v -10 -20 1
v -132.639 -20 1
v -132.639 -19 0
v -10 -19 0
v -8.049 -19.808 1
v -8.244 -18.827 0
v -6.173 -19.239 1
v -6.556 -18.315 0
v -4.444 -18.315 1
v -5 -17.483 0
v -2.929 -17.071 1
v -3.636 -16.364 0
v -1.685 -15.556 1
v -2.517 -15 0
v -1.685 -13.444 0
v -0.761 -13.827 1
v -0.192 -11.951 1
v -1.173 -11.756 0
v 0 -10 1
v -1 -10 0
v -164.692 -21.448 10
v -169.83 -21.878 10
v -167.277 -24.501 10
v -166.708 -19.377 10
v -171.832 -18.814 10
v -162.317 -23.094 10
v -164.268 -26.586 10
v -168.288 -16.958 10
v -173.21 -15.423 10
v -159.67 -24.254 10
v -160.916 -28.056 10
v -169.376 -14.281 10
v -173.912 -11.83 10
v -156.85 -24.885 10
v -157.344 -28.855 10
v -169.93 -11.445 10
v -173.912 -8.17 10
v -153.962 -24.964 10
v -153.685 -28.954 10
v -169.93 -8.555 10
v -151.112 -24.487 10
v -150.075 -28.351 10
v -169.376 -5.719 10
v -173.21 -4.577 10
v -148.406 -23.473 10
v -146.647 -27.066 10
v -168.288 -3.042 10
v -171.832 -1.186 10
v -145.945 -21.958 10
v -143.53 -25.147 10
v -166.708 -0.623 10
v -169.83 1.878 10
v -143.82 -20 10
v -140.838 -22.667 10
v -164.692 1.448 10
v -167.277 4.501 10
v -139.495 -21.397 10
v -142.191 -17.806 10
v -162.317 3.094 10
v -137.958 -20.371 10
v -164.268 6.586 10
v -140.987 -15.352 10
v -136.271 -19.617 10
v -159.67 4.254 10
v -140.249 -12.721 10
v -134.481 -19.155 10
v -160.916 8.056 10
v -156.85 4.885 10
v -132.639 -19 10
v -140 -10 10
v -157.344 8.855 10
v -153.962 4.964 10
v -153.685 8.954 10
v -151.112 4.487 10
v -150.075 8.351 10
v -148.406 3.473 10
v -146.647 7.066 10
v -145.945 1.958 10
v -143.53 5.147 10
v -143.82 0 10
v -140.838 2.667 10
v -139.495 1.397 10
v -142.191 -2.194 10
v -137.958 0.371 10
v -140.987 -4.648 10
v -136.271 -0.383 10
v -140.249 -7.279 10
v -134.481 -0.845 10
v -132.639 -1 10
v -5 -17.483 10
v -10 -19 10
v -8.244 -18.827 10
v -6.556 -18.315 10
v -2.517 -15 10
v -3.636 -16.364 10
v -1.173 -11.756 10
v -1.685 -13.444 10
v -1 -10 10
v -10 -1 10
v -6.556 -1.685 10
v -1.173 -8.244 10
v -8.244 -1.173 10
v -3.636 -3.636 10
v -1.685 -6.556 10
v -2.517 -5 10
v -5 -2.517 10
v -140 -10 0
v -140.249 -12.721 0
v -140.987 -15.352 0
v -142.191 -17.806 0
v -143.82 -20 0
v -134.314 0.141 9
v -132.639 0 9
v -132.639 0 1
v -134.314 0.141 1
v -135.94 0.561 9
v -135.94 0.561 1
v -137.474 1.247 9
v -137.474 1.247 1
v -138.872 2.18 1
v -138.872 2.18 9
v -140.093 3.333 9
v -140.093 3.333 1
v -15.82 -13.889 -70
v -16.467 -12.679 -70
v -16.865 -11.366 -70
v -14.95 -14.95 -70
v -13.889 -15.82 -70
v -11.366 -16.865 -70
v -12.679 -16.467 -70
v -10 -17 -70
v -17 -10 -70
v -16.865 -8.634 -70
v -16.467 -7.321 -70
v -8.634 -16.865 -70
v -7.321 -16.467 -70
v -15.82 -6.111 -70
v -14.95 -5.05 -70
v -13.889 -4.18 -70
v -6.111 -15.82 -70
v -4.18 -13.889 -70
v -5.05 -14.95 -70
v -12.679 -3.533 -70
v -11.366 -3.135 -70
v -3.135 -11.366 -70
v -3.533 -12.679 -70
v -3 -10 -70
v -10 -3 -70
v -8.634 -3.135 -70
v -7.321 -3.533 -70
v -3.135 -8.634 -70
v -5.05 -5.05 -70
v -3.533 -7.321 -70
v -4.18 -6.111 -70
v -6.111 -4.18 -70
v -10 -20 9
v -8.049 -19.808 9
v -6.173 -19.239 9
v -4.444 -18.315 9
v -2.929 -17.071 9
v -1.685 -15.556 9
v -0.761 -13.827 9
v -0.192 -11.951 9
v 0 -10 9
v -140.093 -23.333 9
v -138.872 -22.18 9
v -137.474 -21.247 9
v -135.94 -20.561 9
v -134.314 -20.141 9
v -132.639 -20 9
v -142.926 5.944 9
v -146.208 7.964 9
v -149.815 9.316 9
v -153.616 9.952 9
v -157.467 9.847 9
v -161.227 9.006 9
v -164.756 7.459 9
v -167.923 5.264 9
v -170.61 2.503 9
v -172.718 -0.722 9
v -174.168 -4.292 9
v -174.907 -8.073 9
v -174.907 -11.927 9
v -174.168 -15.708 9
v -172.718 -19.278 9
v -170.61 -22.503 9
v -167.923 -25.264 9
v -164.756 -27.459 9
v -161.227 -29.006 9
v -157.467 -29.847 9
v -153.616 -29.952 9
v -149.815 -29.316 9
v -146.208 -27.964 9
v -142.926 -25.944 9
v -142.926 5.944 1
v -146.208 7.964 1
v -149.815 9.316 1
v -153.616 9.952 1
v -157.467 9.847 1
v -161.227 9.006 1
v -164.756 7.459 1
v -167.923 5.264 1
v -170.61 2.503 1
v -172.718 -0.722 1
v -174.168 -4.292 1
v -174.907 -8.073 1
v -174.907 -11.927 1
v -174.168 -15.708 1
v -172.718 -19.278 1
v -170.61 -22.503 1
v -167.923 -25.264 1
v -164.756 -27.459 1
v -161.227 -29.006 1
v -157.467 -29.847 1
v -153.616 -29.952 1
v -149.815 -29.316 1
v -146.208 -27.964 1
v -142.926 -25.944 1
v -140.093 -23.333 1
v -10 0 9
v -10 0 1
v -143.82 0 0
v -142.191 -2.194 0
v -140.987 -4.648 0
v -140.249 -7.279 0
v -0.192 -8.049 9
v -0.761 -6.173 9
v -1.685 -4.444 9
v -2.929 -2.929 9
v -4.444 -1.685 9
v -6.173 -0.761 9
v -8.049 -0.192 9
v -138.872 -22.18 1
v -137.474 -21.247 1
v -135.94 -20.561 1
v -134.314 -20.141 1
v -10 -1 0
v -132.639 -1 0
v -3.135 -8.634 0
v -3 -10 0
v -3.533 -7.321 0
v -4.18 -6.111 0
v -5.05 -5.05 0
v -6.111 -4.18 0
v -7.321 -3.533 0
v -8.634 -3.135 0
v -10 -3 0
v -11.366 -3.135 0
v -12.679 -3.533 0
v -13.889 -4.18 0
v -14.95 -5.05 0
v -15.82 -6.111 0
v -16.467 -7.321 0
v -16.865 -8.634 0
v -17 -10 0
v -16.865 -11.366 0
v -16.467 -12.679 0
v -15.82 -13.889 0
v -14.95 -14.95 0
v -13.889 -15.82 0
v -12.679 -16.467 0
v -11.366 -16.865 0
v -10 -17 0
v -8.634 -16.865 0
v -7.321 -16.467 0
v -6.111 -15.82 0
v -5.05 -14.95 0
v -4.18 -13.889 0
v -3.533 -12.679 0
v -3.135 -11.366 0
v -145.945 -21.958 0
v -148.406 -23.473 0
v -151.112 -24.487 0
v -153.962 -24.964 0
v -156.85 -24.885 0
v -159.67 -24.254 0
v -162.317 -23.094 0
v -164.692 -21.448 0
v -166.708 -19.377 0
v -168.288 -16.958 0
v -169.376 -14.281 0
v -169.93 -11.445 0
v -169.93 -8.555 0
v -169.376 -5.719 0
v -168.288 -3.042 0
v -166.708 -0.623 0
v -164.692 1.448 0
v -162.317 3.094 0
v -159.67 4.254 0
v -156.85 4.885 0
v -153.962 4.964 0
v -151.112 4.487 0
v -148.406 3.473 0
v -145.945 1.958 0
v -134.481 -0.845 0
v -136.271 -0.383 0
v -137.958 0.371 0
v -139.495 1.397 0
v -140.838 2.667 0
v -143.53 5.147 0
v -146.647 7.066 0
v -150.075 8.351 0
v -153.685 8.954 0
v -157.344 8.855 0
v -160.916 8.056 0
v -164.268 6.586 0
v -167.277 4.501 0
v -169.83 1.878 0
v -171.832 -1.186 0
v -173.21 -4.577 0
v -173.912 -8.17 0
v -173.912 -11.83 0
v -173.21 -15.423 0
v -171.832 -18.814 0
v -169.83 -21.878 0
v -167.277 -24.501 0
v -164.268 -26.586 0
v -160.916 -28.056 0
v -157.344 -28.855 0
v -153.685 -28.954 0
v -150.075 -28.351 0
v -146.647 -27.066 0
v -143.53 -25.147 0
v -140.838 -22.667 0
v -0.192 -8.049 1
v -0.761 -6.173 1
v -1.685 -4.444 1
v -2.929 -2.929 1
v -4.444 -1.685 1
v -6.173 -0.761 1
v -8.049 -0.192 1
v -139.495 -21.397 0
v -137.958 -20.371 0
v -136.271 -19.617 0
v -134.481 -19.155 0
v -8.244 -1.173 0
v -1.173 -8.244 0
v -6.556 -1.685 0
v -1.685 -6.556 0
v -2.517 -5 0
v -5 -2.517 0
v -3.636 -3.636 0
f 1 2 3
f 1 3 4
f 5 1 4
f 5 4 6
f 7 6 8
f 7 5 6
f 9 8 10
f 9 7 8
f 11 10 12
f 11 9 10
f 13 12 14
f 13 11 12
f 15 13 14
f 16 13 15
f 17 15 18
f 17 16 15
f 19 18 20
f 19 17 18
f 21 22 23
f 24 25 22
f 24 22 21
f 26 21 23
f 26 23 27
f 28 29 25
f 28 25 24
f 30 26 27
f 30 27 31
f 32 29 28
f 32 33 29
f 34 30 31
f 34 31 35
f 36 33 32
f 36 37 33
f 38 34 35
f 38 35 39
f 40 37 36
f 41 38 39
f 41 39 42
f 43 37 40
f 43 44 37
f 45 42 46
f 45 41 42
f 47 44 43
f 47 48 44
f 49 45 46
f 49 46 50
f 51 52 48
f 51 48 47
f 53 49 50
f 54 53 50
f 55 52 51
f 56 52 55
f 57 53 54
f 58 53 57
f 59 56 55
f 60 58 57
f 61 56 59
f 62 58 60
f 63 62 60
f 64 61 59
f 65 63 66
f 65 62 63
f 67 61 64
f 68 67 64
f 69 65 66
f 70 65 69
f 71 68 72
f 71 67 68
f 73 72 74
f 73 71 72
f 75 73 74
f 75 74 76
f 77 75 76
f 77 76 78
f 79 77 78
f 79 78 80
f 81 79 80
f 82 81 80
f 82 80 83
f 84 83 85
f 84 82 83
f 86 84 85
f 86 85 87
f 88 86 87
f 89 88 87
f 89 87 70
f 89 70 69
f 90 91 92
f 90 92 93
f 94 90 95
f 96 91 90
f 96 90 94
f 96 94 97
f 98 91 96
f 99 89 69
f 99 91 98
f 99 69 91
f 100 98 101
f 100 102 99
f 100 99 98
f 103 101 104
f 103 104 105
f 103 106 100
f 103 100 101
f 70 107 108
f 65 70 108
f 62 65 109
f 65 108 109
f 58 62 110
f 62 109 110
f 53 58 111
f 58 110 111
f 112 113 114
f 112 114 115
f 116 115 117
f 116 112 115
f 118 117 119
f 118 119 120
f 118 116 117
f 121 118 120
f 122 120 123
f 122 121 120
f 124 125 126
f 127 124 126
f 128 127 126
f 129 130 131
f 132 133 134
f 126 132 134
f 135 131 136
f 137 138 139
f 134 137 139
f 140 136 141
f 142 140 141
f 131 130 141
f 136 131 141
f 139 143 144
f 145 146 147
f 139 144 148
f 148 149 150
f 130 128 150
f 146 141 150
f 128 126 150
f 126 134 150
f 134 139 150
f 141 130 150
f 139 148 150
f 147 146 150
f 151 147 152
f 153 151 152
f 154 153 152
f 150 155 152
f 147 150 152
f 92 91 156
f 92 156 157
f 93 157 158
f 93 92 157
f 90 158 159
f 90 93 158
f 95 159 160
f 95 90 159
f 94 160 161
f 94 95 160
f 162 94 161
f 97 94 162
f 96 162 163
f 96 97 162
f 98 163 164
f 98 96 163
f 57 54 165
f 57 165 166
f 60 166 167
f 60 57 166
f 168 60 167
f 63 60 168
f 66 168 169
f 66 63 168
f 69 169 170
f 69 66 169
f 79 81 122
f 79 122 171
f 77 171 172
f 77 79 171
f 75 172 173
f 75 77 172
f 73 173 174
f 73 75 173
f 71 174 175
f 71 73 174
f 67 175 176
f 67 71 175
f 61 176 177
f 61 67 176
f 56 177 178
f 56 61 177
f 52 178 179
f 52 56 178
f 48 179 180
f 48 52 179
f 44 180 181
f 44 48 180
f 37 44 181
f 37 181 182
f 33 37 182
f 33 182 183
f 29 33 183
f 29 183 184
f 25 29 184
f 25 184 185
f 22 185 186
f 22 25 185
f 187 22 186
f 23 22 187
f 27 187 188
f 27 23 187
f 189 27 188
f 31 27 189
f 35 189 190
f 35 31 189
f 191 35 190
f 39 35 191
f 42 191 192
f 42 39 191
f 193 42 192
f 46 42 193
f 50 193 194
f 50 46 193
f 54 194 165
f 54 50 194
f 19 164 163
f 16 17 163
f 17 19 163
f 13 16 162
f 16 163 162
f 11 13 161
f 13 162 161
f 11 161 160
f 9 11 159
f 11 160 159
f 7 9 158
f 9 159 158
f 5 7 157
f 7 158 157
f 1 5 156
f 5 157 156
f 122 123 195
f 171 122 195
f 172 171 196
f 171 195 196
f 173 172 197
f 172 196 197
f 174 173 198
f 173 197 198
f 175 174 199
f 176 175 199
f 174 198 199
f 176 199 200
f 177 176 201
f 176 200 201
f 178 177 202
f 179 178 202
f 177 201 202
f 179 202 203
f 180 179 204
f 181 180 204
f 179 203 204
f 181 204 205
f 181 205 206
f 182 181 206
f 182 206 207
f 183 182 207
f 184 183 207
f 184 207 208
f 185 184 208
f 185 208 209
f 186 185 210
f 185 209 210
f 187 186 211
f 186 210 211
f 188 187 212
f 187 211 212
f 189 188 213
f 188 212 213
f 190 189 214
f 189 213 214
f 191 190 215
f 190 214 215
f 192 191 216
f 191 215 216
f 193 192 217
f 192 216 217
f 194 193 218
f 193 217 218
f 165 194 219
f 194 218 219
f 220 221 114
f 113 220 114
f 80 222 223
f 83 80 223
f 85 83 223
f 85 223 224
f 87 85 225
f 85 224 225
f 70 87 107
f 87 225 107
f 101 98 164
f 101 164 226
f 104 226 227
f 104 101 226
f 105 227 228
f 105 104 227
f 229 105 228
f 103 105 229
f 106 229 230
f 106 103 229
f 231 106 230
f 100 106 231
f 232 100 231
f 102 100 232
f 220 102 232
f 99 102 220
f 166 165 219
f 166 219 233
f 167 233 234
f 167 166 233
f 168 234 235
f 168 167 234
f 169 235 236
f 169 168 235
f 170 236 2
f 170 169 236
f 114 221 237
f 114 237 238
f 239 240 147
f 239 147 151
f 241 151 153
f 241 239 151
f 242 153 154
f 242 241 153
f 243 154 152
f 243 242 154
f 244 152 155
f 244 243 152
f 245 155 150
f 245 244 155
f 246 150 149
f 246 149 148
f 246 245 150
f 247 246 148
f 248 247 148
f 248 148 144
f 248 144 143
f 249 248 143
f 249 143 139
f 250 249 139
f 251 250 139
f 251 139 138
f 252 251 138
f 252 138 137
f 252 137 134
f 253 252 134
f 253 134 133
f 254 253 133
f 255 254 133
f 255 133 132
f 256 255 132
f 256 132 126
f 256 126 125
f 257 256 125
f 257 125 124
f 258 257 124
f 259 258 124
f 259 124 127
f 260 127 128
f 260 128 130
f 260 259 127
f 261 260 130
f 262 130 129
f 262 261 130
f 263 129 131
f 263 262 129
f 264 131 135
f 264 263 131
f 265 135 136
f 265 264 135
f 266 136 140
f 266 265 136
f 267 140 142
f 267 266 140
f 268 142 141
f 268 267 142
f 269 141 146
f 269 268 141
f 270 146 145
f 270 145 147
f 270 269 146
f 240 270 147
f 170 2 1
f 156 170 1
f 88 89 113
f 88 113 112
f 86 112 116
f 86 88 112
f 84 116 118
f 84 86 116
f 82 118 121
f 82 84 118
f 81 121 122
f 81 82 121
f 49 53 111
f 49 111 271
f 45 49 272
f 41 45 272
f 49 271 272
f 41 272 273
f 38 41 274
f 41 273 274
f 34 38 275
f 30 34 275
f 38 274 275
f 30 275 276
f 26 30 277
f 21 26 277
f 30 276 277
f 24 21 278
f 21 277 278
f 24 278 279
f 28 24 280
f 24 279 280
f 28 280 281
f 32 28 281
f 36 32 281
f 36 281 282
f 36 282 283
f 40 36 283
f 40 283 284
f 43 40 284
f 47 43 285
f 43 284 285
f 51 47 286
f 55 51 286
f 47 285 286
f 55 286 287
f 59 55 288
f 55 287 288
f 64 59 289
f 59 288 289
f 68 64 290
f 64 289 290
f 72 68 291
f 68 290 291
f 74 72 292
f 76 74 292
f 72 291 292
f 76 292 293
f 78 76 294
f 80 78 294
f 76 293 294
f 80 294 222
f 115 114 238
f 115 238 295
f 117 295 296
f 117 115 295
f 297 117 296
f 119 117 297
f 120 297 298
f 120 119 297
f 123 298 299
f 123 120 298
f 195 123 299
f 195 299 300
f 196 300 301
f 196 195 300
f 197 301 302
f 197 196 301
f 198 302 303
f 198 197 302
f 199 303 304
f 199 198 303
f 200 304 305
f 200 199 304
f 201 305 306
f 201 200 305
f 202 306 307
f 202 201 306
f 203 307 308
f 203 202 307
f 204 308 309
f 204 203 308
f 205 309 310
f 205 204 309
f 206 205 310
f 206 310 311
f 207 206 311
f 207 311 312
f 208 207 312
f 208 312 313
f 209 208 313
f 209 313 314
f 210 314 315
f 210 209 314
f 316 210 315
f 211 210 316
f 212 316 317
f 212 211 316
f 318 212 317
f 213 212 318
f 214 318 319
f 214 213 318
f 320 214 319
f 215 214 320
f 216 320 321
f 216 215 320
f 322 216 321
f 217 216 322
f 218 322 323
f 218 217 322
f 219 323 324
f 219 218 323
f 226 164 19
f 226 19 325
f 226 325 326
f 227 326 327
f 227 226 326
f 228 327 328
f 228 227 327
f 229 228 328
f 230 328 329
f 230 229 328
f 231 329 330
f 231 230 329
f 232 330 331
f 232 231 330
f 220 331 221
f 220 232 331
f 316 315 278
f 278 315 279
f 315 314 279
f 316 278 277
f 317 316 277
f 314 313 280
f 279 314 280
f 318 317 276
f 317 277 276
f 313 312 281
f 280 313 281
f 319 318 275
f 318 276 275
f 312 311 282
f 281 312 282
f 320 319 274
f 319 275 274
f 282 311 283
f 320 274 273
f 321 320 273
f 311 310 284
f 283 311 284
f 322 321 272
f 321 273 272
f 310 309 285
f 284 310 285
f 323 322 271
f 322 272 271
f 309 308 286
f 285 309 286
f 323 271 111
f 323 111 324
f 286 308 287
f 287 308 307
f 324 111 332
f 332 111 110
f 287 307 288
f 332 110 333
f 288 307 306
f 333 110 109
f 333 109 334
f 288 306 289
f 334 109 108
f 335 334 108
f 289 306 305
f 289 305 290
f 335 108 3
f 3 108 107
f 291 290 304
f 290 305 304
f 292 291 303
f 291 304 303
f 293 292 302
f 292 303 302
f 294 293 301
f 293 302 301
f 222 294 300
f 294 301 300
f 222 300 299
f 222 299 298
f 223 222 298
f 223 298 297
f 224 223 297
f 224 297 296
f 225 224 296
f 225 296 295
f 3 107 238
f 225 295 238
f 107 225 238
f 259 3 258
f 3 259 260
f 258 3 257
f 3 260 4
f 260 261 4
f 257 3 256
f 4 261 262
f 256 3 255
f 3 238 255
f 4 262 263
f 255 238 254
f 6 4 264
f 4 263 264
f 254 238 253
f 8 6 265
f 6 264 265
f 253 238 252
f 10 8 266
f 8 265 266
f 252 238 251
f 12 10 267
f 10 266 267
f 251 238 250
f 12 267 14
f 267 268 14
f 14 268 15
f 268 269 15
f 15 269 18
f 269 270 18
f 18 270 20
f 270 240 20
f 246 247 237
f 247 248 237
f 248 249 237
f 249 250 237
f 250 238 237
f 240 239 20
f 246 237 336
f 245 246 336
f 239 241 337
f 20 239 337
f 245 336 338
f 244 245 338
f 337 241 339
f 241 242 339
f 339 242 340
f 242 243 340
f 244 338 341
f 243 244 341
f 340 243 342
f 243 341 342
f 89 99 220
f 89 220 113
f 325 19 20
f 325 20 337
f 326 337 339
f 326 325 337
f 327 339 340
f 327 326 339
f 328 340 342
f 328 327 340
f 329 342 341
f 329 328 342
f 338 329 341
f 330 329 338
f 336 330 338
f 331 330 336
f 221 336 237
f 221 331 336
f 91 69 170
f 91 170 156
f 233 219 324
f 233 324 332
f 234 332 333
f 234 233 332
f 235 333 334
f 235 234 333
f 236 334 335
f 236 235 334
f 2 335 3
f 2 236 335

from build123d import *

# Parameters (mm, degrees)
F0_R     = 7
F1_DEPTH = 10
F2_DEPTH = 10.001
F3_R     = 9.99999
F4_SIZE  = 1
F5_R     = 7
F6_DEPTH = 80


# Not quite as in the source:
# - a fillet or chamfer is up to 0.001 mm smaller than in the source, because OpenCascade refuses the exact size


with BuildPart() as f1:
    # F0 (on Top) → F1 (new body)
    with BuildSketch(Plane.XY):
        with BuildLine():
            Line((0, -20), (0, 0))
            Line((0, 0), (-137.6794919243, 0))
            ThreePointArc((-137.6794919243, 0), (-135.6814834742, -4.8236190979), (-135, -10))
            ThreePointArc((-135, -10), (-135.6814834742, -15.1763809021), (-137.6794919243, -20))
            Line((-137.6794919243, -20), (0, -20))
        make_face()
        with Locations((-10, -10)):
            Circle(F0_R, mode=Mode.SUBTRACT)
        with BuildLine():
            Line((-143.8196601125, 0), (-137.6794919243, 0))
            ThreePointArc((-137.6794919243, 0), (-175, -10), (-137.6794919243, -20))
            Line((-137.6794919243, -20), (-143.8196601125, -20))
            ThreePointArc((-143.8196601125, -20), (-170, -10), (-143.8196601125, 0))
        make_face()
        with BuildLine():
            ThreePointArc((-135, -10), (-135.6814834742, -4.8236190979), (-137.6794919243, 0))
            Line((-137.6794919243, 0), (-143.8196601125, 0))
            ThreePointArc((-143.8196601125, 0), (-140.9874146156, -4.6476686534), (-140, -10))
            ThreePointArc((-140, -10), (-140.9874146156, -15.3523313466), (-143.8196601125, -20))
            Line((-143.8196601125, -20), (-137.6794919243, -20))
            ThreePointArc((-137.6794919243, -20), (-135.6814834742, -15.1763809021), (-135, -10))
        make_face()
    extrude(amount=F1_DEPTH)

    # F0 (on Top) → F2 (cut, through all)
    with BuildSketch(Plane.XY):
        with BuildLine():
            Line((-165, 0), (-143.8196601125, 0))
            ThreePointArc((-143.8196601125, 0), (-170, -10), (-143.8196601125, -20))
            Line((-143.8196601125, -20), (-165, -20))
            Line((-165, -20), (-165, 0))
        make_face()
        with BuildLine():
            ThreePointArc((-140, -10), (-140.9874146156, -4.6476686534), (-143.8196601125, 0))
            Line((-143.8196601125, 0), (-165, 0))
            Line((-165, 0), (-165, -20))
            Line((-165, -20), (-143.8196601125, -20))
            ThreePointArc((-143.8196601125, -20), (-140.9874146156, -15.3523313466), (-140, -10))
        make_face()
        with Locations((-10, -10)):
            Circle(F0_R)
    extrude(amount=F2_DEPTH, mode=Mode.SUBTRACT)

    # F3 (radius 10 in the source; OpenCascade refuses exactly that, so slightly less here)
    f3_edges = [f1.edges().sort_by_distance(p)[0] for p in [
        (0, -20, 5),
        (0, 0, 5),
        (-137.679492, -20, 5),
        (-137.679492, 0, 5),
    ]]
    fillet(f3_edges, radius=F3_R)

    # F4
    f4_edges = [f1.edges().sort_by_distance(p)[0] for p in [
        (-71.319657, -20, 0),
        (-2.928929, -2.928929, 10),
        (-71.319657, -20, 10),
        (-136.721804, -20.87129, 0),
        (-2.928929, -17.071071, 0),
        (-175, -10, 0),
        (0, -10, 0),
        (-136.721804, 0.87129, 0),
        (-2.928929, -2.928929, 0),
        (-71.319657, 0, 0),
        (-136.721804, -20.87129, 10),
        (-2.928929, -17.071071, 10),
        (-175, -10, 10),
        (0, -10, 10),
        (-136.721804, 0.87129, 10),
        (-71.319657, 0, 10),
    ]]
    chamfer(f4_edges, length=F4_SIZE)

    # F5 (on face) → F6 (join)
    with BuildSketch(Plane.XY.offset(10)):
        with Locations((-10, -10)):
            Circle(F5_R)
    extrude(amount=-F6_DEPTH)


solid = f1.part
